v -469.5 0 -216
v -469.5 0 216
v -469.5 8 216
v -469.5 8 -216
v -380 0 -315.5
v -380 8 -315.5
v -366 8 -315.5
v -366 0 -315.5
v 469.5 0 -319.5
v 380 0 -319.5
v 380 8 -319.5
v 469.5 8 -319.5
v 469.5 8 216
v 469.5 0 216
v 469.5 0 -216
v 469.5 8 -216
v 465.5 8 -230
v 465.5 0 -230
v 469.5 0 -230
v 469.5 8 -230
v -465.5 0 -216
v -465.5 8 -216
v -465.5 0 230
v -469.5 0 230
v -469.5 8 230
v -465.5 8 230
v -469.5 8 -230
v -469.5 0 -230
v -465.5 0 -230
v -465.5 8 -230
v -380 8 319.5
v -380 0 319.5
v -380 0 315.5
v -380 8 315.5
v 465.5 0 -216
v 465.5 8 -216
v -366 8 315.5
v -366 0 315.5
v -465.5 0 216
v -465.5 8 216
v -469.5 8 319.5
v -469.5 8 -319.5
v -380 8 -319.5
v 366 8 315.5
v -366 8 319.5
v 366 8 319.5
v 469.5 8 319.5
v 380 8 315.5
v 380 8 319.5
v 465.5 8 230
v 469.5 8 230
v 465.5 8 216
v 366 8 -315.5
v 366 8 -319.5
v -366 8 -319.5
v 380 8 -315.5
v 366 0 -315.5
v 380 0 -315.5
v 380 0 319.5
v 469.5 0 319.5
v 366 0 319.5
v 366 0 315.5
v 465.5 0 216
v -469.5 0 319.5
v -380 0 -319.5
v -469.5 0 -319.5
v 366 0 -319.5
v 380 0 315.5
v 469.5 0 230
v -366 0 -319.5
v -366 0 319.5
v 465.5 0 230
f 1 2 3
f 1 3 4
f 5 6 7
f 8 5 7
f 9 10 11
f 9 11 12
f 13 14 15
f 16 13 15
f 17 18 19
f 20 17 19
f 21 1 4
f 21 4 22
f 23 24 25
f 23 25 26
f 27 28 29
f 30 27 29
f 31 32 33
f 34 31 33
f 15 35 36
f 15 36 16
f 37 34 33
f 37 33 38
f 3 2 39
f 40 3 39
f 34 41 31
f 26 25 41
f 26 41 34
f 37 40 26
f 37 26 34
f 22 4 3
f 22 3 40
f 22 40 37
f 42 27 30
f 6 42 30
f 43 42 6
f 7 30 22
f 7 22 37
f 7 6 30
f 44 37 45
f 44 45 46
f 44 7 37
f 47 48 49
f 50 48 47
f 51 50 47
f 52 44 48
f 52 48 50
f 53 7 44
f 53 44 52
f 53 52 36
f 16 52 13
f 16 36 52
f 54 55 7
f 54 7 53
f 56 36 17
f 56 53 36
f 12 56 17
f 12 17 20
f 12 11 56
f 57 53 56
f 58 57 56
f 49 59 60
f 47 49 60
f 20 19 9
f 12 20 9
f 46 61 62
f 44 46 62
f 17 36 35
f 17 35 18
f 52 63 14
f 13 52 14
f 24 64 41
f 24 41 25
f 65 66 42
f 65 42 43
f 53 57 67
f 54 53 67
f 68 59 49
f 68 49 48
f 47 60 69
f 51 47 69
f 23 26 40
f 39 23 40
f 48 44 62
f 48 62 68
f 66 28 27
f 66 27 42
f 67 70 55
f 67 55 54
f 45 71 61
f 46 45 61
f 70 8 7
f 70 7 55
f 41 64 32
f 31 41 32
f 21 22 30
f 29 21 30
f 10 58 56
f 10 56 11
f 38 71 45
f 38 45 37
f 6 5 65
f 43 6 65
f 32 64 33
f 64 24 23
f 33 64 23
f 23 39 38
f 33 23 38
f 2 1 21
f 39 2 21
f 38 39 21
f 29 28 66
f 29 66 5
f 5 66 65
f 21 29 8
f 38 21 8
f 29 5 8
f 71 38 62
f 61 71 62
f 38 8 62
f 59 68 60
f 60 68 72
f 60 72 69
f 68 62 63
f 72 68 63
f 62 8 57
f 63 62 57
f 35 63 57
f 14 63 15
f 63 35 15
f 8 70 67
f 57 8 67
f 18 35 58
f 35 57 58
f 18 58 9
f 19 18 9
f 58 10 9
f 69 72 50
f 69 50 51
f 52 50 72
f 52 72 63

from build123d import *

# Parameters (mm, degrees)
SKETCH1_W           = 939
SKETCH1_H           = 639
BOSS_EXTRUDE1_DEPTH = 8
SKETCH2_W           = 14
SKETCH2_H           = 8
SKETCH2_W_2         = 8
SKETCH2_H_2         = 14
CUT_EXTRUDE1_DEPTH  = 9


with BuildPart() as part:
    # Sketch1 → Boss-Extrude1 (new body)
    with BuildSketch(Plane(origin=(0, 0, 0), x_dir=(1, 0, 0), z_dir=(0, 1, 0))):
        Rectangle(SKETCH1_W, SKETCH1_H)
    extrude(amount=BOSS_EXTRUDE1_DEPTH)

    # Sketch2 → Cut-Extrude1 (cut, through all)
    with BuildSketch(Plane(origin=(0, 8, 0), x_dir=(1, 0, 0), z_dir=(0, 1, 0))):
        with Locations((-373, -319.5)):
            Rectangle(SKETCH2_W, SKETCH2_H)
        with Locations((373, -319.5)):
            Rectangle(SKETCH2_W, SKETCH2_H)
        with Locations((-373, 319.5)):
            Rectangle(SKETCH2_W, SKETCH2_H)
        with Locations((-469.5, -223)):
            Rectangle(SKETCH2_W_2, SKETCH2_H_2)
        with Locations((373, 319.5)):
            Rectangle(SKETCH2_W, SKETCH2_H)
        with Locations((-469.5, 223)):
            Rectangle(SKETCH2_W_2, SKETCH2_H_2)
        with Locations((469.5, 223)):
            Rectangle(SKETCH2_W_2, SKETCH2_H_2)
        with Locations((469.5, -223)):
            Rectangle(SKETCH2_W_2, SKETCH2_H_2)
    extrude(amount=-CUT_EXTRUDE1_DEPTH, mode=Mode.SUBTRACT)


solid = part.part
